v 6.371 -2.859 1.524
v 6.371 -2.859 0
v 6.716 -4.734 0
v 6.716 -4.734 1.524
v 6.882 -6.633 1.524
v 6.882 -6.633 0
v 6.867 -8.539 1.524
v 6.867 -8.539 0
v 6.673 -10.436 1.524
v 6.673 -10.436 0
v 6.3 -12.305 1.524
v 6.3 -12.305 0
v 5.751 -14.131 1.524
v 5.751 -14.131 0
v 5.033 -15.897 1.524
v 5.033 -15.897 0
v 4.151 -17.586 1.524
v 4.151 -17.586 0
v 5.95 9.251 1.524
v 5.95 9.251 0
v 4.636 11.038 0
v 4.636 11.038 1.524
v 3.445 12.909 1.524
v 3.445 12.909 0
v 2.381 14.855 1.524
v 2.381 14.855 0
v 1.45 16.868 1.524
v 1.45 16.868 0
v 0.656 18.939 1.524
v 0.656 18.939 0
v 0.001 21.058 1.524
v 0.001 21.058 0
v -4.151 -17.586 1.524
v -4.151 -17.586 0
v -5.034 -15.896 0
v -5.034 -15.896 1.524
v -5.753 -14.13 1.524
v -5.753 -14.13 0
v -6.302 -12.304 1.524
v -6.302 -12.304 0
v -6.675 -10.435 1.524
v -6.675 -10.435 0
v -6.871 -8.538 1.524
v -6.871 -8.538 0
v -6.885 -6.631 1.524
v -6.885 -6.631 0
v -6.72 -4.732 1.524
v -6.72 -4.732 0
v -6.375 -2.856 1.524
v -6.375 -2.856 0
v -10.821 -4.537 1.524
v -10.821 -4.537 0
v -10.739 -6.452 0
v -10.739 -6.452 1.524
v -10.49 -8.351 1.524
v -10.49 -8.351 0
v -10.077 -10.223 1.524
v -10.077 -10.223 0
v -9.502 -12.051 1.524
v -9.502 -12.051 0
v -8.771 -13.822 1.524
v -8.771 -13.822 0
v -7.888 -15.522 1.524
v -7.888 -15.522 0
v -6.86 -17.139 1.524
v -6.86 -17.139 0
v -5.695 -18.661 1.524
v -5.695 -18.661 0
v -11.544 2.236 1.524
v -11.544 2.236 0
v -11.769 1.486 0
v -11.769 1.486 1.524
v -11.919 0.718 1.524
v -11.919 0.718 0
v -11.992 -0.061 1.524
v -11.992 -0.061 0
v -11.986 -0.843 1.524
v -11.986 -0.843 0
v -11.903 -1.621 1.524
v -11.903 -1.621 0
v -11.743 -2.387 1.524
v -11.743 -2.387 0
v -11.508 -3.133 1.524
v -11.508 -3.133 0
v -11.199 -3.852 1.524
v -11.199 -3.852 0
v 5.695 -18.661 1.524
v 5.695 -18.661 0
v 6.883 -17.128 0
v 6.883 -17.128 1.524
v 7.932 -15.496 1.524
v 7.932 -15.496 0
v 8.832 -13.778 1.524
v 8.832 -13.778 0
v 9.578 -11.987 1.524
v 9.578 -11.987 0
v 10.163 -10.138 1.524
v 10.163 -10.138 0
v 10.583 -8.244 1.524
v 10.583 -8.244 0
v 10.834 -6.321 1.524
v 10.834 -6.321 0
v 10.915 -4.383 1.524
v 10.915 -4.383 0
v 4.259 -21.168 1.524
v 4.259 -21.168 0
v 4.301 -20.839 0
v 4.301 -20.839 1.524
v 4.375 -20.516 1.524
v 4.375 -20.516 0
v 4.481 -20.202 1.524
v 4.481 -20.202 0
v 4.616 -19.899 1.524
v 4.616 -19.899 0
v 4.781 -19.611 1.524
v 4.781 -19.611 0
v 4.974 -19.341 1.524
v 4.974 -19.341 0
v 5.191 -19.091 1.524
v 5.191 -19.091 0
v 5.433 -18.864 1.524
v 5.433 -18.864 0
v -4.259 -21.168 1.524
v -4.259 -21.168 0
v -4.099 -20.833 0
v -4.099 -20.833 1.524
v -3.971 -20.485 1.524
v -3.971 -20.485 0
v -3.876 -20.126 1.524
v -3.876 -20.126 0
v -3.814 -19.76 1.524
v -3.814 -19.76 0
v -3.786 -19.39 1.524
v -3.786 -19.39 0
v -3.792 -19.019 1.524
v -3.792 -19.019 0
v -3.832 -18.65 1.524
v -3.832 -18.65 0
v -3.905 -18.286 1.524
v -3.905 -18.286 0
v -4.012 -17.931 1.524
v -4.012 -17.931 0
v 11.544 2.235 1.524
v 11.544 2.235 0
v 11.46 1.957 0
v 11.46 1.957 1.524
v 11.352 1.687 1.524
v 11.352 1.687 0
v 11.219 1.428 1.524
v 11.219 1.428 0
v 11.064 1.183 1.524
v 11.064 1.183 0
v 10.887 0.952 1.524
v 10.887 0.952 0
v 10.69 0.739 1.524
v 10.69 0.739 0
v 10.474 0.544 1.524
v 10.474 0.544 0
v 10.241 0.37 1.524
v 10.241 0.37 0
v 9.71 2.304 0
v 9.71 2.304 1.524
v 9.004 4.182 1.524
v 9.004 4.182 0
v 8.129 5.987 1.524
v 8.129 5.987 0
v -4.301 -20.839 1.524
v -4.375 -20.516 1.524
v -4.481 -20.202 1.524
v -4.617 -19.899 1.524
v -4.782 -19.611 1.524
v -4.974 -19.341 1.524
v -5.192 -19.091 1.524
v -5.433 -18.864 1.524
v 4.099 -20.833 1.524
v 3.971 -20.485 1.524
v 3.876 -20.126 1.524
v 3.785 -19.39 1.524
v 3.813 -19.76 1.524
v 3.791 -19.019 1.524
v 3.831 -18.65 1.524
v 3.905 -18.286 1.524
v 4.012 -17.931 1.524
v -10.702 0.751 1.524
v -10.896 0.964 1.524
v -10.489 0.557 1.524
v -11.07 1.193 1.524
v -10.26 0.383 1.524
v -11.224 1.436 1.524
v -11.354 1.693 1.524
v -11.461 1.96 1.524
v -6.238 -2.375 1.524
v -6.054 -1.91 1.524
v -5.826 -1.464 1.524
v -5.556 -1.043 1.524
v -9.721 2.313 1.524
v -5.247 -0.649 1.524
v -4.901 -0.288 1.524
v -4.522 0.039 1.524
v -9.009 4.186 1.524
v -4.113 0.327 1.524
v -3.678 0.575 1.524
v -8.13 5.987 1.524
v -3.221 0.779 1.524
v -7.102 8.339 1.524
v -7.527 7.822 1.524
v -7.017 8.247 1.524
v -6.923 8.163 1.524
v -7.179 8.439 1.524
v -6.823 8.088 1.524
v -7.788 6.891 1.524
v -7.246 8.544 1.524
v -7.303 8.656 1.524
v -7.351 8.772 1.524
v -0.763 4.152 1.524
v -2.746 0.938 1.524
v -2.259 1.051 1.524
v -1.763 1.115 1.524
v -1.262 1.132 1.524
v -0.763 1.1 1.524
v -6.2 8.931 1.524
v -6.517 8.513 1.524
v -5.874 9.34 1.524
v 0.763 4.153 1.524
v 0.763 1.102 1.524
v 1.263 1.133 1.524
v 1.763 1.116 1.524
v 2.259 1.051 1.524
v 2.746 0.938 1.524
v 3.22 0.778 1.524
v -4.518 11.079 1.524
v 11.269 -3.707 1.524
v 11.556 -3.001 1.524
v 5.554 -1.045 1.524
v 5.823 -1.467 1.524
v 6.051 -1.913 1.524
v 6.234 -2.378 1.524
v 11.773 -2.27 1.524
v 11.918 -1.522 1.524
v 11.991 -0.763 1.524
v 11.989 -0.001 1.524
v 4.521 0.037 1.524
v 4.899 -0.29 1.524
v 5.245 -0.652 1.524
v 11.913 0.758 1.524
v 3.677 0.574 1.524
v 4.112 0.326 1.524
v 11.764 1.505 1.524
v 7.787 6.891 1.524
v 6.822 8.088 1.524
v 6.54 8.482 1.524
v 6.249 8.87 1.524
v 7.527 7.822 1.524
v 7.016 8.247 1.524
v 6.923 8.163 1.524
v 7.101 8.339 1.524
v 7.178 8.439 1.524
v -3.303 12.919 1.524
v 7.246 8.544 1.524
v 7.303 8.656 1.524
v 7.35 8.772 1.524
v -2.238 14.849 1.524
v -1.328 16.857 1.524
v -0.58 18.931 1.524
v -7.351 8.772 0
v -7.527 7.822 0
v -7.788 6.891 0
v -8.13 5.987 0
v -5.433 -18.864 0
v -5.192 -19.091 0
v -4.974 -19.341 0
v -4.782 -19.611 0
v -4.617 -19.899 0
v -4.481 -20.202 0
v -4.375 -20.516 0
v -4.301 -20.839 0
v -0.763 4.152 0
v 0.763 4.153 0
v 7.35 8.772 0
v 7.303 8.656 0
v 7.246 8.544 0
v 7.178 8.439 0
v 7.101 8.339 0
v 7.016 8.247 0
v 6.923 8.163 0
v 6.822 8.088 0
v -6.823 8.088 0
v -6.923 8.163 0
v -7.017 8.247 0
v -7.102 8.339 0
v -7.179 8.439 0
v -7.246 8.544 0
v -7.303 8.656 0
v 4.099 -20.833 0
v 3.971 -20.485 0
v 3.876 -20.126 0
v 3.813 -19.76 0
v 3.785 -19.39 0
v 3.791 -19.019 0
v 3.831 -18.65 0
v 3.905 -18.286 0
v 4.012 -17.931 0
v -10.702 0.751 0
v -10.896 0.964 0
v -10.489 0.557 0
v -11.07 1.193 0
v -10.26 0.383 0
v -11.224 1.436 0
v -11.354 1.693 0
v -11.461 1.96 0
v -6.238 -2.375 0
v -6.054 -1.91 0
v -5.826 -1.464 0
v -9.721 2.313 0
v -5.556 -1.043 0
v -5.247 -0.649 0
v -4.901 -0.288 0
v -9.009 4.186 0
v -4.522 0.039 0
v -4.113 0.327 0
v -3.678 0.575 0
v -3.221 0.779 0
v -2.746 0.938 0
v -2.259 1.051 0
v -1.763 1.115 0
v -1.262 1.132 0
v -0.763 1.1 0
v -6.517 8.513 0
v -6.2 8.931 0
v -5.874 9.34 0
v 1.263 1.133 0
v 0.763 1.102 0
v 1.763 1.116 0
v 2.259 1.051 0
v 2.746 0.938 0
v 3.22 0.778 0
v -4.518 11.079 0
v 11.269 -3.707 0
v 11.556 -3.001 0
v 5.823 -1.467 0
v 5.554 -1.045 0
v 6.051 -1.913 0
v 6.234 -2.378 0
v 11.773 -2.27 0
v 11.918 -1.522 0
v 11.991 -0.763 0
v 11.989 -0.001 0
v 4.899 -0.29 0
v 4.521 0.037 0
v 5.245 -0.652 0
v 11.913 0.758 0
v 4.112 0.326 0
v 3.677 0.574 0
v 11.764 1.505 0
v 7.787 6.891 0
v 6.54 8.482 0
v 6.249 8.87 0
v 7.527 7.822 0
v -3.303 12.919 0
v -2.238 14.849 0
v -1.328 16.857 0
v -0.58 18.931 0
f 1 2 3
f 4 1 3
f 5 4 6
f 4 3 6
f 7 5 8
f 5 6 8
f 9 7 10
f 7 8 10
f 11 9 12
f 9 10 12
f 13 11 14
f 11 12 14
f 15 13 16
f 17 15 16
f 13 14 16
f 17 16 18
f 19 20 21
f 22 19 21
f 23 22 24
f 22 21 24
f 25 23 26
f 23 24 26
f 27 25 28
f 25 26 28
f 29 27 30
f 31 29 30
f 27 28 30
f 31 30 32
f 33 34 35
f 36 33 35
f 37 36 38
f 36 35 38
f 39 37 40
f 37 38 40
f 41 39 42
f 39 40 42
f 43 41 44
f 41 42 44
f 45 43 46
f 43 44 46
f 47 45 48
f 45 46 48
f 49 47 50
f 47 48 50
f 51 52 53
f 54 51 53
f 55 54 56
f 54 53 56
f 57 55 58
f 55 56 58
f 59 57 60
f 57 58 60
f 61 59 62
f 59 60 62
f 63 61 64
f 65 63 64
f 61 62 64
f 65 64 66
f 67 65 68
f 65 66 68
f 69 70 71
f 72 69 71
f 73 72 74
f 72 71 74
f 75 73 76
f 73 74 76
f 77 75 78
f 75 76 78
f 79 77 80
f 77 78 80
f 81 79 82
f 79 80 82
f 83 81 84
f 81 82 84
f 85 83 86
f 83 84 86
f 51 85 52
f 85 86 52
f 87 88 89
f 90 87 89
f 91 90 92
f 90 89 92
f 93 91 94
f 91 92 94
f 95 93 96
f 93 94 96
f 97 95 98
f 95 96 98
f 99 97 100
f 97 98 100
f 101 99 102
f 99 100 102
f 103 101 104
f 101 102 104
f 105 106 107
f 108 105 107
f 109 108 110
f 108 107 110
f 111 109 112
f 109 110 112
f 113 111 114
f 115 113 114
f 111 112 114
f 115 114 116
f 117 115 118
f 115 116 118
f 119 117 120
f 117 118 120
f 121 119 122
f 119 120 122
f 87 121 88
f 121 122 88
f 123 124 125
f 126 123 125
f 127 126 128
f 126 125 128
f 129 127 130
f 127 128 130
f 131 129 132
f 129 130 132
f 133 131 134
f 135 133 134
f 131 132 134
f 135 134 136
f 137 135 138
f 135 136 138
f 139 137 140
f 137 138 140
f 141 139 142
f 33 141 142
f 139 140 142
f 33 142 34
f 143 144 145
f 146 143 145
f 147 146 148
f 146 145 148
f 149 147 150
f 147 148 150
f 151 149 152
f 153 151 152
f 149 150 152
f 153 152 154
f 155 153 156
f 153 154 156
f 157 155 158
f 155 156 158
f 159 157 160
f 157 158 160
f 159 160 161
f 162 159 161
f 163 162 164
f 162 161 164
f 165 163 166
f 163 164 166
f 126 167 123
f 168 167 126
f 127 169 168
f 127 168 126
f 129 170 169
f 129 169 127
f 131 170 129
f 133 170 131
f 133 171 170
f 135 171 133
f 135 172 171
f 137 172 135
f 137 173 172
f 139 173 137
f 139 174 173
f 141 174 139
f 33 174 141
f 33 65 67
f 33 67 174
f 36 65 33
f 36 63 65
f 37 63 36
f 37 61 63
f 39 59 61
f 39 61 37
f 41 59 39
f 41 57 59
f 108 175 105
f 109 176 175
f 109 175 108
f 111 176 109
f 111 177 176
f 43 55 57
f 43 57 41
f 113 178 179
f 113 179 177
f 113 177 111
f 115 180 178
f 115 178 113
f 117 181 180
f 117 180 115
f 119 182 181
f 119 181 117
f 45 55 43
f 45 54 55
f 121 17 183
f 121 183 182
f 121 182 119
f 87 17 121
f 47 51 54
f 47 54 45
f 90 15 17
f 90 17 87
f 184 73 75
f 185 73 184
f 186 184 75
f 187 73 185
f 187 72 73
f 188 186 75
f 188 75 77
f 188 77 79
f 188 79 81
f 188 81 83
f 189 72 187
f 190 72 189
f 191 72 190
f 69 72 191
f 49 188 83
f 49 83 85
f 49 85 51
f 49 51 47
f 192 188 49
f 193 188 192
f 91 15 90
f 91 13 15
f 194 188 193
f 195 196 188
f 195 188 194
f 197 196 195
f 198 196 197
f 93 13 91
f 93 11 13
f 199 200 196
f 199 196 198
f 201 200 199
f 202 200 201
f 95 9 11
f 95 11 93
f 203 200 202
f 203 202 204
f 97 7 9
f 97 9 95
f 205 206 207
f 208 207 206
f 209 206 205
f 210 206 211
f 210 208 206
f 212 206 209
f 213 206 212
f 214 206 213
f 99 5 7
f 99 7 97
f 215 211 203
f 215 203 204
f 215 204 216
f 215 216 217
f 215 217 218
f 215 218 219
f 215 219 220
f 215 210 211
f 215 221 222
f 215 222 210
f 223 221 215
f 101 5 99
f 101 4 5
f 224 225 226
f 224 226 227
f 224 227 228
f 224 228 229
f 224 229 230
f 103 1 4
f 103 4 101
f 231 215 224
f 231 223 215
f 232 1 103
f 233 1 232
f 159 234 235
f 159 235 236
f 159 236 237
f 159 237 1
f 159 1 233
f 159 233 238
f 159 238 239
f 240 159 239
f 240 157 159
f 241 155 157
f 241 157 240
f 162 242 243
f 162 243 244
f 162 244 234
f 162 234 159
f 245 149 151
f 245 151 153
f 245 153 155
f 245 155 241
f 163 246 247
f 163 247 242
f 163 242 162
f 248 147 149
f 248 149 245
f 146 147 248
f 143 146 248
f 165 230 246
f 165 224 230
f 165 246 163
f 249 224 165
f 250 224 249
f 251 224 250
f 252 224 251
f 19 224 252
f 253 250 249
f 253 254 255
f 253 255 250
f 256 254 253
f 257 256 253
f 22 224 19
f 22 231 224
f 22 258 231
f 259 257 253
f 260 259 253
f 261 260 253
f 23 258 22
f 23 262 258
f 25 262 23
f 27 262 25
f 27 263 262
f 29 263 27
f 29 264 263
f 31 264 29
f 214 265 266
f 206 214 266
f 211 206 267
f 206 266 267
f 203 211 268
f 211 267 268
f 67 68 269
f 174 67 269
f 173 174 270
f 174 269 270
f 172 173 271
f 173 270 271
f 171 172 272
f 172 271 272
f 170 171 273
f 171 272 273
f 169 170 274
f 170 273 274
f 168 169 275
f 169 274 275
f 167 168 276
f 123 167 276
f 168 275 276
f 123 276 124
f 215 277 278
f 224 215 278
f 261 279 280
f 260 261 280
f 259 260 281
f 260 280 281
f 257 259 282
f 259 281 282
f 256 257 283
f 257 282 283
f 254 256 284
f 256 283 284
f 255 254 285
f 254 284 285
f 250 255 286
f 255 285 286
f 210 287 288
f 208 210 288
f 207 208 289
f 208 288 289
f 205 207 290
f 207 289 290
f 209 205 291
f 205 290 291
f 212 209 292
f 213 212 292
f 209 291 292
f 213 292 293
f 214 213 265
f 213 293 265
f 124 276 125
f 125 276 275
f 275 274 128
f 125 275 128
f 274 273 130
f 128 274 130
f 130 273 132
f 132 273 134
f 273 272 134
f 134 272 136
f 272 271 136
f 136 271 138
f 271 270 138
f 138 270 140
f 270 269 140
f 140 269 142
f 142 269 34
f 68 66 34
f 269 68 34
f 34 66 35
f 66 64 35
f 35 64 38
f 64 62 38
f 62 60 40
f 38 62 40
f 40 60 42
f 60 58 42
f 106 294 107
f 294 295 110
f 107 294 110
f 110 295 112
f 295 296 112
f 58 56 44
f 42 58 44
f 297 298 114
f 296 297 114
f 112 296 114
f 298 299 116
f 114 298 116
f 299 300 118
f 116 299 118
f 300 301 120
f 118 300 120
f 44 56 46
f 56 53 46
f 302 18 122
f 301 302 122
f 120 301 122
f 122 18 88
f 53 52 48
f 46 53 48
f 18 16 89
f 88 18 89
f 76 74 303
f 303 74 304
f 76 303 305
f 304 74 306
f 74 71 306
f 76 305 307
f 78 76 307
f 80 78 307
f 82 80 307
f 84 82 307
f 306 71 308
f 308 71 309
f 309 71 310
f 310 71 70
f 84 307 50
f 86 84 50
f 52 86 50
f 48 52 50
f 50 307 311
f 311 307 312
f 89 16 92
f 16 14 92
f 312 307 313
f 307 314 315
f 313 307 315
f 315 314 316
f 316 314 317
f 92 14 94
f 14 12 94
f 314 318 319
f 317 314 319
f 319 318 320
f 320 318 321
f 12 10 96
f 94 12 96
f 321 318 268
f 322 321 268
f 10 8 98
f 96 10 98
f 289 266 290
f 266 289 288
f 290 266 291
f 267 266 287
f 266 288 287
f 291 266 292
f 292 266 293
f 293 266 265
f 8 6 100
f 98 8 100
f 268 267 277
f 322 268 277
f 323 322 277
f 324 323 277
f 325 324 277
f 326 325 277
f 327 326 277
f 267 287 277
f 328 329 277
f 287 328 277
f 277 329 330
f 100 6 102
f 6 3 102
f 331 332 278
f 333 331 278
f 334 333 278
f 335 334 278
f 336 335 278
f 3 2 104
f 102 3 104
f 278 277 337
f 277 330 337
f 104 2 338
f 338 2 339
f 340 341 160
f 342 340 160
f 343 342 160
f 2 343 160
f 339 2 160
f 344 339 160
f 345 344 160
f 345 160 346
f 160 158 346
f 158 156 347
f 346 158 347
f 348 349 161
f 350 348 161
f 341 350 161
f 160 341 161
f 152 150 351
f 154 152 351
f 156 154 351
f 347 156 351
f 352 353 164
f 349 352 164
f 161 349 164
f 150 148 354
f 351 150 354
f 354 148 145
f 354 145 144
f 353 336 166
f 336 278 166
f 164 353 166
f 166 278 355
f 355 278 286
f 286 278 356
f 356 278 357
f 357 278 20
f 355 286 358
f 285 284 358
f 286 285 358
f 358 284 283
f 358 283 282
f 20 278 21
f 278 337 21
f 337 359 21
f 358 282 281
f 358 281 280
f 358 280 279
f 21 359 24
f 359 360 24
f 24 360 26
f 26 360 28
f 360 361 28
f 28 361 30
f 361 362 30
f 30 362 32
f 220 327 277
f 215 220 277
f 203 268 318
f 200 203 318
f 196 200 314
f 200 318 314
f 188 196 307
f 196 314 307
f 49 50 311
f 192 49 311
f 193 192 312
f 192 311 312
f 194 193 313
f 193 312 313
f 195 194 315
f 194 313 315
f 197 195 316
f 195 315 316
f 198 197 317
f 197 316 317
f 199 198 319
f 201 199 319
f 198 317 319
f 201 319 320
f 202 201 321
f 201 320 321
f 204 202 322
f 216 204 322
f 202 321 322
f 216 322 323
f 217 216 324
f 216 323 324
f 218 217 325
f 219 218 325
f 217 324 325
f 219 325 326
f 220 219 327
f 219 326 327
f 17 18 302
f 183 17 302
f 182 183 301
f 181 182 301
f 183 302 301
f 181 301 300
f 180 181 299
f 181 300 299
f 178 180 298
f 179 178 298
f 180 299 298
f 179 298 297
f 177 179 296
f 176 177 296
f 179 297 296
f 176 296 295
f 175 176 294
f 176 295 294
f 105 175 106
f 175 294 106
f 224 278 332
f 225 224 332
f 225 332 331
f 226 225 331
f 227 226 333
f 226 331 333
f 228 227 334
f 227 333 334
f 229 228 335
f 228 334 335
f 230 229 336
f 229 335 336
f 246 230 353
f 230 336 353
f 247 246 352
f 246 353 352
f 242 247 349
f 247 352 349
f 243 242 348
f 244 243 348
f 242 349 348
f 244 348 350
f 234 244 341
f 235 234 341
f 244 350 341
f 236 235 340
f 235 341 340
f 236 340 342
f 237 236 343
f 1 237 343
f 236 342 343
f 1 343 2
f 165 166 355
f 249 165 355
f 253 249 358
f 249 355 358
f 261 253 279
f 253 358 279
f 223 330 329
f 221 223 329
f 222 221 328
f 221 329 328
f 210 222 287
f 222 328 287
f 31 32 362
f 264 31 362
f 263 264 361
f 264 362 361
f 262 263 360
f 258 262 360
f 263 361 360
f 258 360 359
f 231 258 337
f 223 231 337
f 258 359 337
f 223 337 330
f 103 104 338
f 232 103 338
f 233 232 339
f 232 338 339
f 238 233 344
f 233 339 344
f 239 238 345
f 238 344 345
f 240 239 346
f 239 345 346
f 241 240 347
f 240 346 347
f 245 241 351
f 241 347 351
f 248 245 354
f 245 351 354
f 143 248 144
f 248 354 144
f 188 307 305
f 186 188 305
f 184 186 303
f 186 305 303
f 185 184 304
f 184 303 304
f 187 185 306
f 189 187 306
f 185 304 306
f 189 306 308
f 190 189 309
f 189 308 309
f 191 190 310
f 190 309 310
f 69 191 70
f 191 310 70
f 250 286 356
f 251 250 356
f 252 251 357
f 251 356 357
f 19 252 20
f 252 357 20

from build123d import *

# Parameters (mm, degrees)
BOSS_EXTRUDE1_DEPTH = 1.524


with BuildPart() as part:
    # Sketch1 → Boss-Extrude1 (new body)
    with BuildSketch(Plane.XY):
        with BuildLine():
            Line((-0.762799401, 4.151739841), (0.763181799, 4.152733255))
            Line((0.763181799, 4.152733255), (0.763181799, 1.101764269))
            ThreePointArc((0.763181799, 1.101764269), (4.319640518, 0.186449021), (6.371385502, -2.859292784))
            ThreePointArc((6.371385502, -2.859292784), (6.672574584, -10.435641577), (4.151071361, -17.586431561))
            ThreePointArc((4.151071361, -17.586431561), (3.785308505, -19.389837846), (4.258503872, -21.168079349))
            ThreePointArc((4.258503872, -21.168079349), (4.695327747, -19.753303526), (5.694864831, -18.660906461))
            ThreePointArc((5.694864831, -18.660906461), (9.578008584, -11.987204881), (10.914606675, -4.382561317))
            ThreePointArc((10.914606675, -4.382561317), (11.963687789, -1.143514723), (11.54368289, 2.235181758))
            ThreePointArc((11.54368289, 2.235181758), (11.063913724, 1.182736218), (10.240953414, 0.369990013))
            ThreePointArc((10.240953414, 0.369990013), (9.378846201, 3.251271559), (8.129251062, 5.986874633))
            ThreePointArc((8.129251062, 5.986874633), (7.646964471, 7.353540521), (7.350228625, 8.772104529))
            ThreePointArc((7.350228625, 8.772104529), (7.140948693, 8.388008696), (6.822386333, 8.088265938))
            ThreePointArc((6.822386333, 8.088265938), (6.395648788, 8.676833831), (5.949561914, 9.25087529))
            ThreePointArc((5.949561914, 9.25087529), (2.381070398, 14.85503863), (0.00144629, 21.058115893))
            ThreePointArc((0.00144629, 21.058115893), (-2.237613904, 14.848855853), (-5.874078491, 9.34027835))
            ThreePointArc((-5.874078491, 9.34027835), (-6.359611605, 8.722749648), (-6.822768731, 8.088265938))
            ThreePointArc((-6.822768731, 8.088265938), (-7.141331091, 8.388008696), (-7.350611023, 8.772104529))
            ThreePointArc((-7.350611023, 8.772104529), (-7.647346869, 7.353540521), (-8.12963346, 5.986874633))
            ThreePointArc((-8.12963346, 5.986874633), (-9.386584799, 3.258077765), (-10.259685397, 0.383368325))
            ThreePointArc((-10.259685397, 0.383368325), (-11.070398481, 1.192598639), (-11.54368289, 2.235724362))
            ThreePointArc((-11.54368289, 2.235724362), (-11.954593886, -1.23311659), (-10.820946706, -4.537136787))
            ThreePointArc((-10.820946706, -4.537136787), (-9.502375995, -12.050586646), (-5.695247229, -18.660906461))
            ThreePointArc((-5.695247229, -18.660906461), (-4.695710145, -19.753303526), (-4.25888627, -21.168079349))
            ThreePointArc((-4.25888627, -21.168079349), (-3.785690903, -19.389837846), (-4.151453759, -17.586431561))
            ThreePointArc((-4.151453759, -17.586431561), (-6.675465031, -10.434527086), (-6.375410647, -2.856246417))
            ThreePointArc((-6.375410647, -2.856246417), (-4.320748698, 0.188135712), (-0.762909272, 1.100098915))
            Line((-0.762909272, 1.100098915), (-0.762799401, 4.151739841))
        make_face()
    extrude(amount=BOSS_EXTRUDE1_DEPTH)


solid = part.part
